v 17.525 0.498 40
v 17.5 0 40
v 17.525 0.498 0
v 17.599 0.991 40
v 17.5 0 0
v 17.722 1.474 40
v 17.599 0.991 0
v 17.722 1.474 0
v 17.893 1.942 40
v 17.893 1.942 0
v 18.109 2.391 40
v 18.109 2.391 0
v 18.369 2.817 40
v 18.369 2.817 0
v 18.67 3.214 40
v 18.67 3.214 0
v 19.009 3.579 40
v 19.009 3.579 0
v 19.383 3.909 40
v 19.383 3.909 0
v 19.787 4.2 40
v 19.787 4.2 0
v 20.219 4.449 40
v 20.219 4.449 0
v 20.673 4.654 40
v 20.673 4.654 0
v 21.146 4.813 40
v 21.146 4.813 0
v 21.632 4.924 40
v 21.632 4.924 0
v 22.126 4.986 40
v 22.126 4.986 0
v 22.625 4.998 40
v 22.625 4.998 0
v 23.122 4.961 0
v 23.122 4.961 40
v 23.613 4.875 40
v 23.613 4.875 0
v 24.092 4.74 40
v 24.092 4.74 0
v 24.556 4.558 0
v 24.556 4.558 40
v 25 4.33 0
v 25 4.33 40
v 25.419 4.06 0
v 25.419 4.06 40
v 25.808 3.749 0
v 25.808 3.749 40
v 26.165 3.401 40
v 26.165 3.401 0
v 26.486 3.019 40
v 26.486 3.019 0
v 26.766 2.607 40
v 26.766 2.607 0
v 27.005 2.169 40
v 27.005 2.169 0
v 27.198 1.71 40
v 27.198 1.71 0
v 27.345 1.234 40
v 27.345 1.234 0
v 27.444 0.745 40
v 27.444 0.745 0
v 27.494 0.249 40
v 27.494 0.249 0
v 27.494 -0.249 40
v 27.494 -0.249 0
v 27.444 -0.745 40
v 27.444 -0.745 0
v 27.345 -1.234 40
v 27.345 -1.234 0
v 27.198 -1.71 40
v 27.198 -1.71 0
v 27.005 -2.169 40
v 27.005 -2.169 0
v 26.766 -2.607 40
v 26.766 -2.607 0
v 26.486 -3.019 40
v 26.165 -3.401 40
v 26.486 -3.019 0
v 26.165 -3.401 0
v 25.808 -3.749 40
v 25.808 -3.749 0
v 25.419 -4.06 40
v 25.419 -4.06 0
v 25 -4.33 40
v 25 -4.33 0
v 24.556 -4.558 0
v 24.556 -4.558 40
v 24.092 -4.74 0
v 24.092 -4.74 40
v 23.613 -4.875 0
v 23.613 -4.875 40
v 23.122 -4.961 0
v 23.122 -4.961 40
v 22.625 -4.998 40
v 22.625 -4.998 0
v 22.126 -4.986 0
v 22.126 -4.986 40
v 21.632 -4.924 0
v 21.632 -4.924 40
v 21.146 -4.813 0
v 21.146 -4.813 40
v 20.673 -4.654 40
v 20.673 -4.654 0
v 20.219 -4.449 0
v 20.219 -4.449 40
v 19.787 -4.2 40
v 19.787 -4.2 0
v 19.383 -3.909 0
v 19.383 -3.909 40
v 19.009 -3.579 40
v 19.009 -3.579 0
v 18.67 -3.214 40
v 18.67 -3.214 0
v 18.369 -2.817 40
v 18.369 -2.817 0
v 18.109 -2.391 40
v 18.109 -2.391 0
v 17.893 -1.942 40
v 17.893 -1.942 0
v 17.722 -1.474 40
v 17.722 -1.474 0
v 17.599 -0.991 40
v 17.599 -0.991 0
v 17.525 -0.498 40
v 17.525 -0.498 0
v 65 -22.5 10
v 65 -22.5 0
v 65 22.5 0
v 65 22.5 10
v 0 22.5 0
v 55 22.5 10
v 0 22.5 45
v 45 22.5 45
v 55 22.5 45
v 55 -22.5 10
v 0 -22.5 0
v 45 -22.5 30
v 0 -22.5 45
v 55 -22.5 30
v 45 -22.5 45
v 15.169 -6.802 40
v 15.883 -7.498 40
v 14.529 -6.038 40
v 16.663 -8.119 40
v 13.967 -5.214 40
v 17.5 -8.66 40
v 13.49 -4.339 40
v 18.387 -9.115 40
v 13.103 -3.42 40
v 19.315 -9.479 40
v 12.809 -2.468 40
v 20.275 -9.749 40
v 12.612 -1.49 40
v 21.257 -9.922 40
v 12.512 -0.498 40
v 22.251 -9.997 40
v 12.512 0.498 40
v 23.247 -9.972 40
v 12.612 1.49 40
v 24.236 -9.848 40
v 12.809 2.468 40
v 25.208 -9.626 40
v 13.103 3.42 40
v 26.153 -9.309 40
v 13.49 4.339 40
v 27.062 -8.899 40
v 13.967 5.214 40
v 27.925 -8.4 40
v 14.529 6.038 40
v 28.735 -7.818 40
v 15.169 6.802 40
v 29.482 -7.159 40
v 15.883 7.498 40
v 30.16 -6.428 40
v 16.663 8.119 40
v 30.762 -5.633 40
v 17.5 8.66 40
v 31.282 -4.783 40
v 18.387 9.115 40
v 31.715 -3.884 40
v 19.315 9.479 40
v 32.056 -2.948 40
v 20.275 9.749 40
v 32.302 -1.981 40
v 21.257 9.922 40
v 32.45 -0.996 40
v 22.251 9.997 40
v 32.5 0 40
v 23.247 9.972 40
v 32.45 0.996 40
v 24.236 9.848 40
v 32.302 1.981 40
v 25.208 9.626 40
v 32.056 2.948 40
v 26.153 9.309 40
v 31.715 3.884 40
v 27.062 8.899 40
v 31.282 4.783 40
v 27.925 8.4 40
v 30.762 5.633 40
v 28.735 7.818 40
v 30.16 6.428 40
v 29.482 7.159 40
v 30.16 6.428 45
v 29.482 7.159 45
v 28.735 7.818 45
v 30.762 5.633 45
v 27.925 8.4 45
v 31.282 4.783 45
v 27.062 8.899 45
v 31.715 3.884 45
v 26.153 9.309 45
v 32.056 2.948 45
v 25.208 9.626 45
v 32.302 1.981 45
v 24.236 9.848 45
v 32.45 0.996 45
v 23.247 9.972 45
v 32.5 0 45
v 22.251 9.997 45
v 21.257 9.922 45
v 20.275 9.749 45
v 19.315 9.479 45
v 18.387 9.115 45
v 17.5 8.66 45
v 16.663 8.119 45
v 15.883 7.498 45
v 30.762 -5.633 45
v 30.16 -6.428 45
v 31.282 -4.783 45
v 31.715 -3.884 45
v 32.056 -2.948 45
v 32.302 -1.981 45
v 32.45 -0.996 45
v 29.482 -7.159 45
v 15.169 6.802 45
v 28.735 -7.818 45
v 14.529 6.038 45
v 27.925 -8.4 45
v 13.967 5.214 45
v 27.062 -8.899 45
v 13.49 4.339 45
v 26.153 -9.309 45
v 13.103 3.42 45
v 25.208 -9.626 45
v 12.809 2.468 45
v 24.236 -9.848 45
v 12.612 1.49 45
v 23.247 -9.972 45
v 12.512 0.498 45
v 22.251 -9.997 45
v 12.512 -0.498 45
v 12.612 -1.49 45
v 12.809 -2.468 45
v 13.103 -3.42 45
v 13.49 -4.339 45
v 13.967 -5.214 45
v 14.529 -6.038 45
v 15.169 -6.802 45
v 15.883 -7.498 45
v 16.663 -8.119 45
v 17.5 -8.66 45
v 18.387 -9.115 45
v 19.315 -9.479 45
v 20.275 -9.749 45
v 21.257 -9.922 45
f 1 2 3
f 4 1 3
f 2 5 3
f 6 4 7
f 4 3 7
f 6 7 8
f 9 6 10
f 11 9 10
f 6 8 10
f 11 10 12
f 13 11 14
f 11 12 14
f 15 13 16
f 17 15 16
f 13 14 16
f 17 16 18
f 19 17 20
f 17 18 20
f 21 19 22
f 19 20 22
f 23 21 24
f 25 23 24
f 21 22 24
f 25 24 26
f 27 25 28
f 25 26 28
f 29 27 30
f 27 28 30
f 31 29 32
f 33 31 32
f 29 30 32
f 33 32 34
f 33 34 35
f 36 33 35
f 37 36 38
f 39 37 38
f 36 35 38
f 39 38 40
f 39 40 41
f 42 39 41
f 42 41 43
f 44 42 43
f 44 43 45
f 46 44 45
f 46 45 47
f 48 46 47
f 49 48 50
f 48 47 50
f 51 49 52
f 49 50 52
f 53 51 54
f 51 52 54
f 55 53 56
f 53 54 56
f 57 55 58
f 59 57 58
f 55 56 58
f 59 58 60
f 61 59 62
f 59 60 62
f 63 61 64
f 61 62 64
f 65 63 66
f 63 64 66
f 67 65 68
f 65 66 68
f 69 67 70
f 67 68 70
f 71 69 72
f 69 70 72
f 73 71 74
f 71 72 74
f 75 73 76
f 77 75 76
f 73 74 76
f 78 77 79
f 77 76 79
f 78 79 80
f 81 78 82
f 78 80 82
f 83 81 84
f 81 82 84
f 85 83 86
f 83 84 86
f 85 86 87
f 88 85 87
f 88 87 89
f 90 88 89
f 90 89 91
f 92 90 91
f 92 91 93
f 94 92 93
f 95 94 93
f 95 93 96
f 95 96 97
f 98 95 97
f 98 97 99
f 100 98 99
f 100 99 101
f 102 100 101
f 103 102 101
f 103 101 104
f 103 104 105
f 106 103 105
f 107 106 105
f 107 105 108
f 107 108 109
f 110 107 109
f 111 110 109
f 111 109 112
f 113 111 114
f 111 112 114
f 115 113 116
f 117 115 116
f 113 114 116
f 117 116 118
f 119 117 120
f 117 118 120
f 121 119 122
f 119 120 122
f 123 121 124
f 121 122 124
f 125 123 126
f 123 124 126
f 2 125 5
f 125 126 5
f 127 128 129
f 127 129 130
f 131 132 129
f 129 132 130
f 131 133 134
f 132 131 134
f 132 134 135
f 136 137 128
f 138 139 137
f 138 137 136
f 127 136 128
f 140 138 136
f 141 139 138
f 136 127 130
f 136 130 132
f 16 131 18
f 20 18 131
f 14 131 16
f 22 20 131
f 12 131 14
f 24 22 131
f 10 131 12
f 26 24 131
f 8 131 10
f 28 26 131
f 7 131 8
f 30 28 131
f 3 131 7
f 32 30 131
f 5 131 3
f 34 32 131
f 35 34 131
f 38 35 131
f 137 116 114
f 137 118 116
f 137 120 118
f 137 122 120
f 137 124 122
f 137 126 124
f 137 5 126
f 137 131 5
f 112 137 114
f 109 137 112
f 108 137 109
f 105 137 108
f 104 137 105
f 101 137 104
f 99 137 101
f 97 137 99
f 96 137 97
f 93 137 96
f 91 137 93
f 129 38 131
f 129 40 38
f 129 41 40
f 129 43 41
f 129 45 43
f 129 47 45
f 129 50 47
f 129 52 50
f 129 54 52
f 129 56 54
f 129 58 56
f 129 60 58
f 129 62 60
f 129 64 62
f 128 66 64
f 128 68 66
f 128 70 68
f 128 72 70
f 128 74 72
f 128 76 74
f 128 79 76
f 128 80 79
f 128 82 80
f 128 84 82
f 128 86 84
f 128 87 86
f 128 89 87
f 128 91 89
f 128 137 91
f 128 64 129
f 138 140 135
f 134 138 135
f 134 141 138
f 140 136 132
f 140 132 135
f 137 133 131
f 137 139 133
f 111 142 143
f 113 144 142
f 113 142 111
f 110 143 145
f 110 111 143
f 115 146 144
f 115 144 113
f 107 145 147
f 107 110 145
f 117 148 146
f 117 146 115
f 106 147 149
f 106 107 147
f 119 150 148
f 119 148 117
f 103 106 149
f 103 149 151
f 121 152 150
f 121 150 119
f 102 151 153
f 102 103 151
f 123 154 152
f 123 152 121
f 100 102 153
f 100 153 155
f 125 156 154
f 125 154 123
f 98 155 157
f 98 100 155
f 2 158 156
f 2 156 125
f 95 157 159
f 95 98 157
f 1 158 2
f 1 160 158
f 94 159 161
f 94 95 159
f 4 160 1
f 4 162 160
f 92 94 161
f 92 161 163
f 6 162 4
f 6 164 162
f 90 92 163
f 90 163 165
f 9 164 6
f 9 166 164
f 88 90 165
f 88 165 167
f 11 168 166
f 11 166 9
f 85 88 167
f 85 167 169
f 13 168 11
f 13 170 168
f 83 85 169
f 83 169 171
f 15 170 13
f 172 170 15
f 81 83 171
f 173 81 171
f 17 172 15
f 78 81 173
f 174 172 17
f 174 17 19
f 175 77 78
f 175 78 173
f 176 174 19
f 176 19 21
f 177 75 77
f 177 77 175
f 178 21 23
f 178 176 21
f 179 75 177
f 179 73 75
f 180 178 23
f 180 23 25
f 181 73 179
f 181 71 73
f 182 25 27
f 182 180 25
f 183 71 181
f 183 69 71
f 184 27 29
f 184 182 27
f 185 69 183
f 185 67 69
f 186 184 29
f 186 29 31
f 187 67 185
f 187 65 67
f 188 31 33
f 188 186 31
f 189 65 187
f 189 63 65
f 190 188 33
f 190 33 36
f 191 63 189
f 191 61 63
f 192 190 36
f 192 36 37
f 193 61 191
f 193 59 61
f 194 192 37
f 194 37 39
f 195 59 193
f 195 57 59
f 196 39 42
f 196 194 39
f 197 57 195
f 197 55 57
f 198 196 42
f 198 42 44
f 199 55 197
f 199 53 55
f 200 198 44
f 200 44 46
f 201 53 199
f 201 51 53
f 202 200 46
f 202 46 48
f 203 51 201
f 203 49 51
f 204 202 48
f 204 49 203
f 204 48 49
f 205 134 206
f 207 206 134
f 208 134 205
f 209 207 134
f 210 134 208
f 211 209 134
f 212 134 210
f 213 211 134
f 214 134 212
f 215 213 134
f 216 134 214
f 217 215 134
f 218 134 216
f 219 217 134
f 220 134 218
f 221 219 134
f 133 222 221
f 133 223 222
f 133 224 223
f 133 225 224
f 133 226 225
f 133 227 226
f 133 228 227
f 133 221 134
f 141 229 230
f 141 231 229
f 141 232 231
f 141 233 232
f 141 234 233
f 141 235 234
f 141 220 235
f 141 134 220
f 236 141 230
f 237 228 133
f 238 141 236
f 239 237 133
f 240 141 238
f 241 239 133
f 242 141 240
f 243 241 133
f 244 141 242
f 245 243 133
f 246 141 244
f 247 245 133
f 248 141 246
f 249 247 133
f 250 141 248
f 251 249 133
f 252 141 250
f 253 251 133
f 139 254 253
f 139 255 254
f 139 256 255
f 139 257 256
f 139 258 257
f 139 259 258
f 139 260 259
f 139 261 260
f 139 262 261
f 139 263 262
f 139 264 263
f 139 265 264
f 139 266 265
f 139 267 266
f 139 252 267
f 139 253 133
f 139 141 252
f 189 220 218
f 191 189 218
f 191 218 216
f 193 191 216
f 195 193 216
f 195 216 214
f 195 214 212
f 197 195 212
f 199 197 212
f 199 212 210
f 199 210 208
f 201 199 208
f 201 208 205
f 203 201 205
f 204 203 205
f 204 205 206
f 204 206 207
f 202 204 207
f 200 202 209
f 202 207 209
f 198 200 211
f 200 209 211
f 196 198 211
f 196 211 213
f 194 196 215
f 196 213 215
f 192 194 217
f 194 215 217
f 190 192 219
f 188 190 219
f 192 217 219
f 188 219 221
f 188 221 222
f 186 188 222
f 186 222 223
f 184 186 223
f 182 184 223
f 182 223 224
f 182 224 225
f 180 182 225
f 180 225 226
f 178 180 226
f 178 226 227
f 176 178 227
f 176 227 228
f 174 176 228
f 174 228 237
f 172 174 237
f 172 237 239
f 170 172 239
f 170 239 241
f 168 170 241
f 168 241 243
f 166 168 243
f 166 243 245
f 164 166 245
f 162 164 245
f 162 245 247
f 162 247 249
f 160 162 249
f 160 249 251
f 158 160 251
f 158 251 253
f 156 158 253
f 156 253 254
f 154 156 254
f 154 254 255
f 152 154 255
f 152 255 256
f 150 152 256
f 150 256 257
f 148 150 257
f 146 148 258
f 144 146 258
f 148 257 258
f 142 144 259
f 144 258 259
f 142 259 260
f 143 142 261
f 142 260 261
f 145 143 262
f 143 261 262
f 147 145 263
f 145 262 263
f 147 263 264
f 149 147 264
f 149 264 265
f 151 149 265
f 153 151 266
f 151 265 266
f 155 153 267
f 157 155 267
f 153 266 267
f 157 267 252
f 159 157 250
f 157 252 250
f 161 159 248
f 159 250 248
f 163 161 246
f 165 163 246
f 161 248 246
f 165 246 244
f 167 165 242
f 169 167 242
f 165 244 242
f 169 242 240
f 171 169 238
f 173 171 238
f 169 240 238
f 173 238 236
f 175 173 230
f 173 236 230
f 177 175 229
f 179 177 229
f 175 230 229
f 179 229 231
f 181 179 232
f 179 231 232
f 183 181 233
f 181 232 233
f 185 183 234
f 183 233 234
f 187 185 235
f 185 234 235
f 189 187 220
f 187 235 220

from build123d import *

# Parameters (mm, degrees)
F1_DEPTH       = 22.5
F3_DEPTH       = 10
F5_D           = 10
F5_CBORE_D     = 20
F5_CBORE_DEPTH = 5


with BuildPart() as f1:
    # F0 (on Front) → F1 (new body, symmetric)
    with BuildSketch(Plane.XZ):
        Polygon((0, 45), (0, 0), (65, 0), (65, 10), (55, 10), (55, 45), align=None)
    extrude(amount=F1_DEPTH, both=True)

    # F2 (on face) → F3 (cut)
    with BuildSketch(Plane.YZ.offset(55)):
        Polygon((-22.5, 45), (-22.5, 30), (22.5, 45), align=None)
    extrude(amount=-F3_DEPTH, mode=Mode.SUBTRACT)

    # F5 (through all)
    with Locations(Plane.XY.offset(45)):
        with Locations((22.5, 0)):
            CounterBoreHole(F5_D / 2, F5_CBORE_D / 2, F5_CBORE_DEPTH)


solid = f1.part
